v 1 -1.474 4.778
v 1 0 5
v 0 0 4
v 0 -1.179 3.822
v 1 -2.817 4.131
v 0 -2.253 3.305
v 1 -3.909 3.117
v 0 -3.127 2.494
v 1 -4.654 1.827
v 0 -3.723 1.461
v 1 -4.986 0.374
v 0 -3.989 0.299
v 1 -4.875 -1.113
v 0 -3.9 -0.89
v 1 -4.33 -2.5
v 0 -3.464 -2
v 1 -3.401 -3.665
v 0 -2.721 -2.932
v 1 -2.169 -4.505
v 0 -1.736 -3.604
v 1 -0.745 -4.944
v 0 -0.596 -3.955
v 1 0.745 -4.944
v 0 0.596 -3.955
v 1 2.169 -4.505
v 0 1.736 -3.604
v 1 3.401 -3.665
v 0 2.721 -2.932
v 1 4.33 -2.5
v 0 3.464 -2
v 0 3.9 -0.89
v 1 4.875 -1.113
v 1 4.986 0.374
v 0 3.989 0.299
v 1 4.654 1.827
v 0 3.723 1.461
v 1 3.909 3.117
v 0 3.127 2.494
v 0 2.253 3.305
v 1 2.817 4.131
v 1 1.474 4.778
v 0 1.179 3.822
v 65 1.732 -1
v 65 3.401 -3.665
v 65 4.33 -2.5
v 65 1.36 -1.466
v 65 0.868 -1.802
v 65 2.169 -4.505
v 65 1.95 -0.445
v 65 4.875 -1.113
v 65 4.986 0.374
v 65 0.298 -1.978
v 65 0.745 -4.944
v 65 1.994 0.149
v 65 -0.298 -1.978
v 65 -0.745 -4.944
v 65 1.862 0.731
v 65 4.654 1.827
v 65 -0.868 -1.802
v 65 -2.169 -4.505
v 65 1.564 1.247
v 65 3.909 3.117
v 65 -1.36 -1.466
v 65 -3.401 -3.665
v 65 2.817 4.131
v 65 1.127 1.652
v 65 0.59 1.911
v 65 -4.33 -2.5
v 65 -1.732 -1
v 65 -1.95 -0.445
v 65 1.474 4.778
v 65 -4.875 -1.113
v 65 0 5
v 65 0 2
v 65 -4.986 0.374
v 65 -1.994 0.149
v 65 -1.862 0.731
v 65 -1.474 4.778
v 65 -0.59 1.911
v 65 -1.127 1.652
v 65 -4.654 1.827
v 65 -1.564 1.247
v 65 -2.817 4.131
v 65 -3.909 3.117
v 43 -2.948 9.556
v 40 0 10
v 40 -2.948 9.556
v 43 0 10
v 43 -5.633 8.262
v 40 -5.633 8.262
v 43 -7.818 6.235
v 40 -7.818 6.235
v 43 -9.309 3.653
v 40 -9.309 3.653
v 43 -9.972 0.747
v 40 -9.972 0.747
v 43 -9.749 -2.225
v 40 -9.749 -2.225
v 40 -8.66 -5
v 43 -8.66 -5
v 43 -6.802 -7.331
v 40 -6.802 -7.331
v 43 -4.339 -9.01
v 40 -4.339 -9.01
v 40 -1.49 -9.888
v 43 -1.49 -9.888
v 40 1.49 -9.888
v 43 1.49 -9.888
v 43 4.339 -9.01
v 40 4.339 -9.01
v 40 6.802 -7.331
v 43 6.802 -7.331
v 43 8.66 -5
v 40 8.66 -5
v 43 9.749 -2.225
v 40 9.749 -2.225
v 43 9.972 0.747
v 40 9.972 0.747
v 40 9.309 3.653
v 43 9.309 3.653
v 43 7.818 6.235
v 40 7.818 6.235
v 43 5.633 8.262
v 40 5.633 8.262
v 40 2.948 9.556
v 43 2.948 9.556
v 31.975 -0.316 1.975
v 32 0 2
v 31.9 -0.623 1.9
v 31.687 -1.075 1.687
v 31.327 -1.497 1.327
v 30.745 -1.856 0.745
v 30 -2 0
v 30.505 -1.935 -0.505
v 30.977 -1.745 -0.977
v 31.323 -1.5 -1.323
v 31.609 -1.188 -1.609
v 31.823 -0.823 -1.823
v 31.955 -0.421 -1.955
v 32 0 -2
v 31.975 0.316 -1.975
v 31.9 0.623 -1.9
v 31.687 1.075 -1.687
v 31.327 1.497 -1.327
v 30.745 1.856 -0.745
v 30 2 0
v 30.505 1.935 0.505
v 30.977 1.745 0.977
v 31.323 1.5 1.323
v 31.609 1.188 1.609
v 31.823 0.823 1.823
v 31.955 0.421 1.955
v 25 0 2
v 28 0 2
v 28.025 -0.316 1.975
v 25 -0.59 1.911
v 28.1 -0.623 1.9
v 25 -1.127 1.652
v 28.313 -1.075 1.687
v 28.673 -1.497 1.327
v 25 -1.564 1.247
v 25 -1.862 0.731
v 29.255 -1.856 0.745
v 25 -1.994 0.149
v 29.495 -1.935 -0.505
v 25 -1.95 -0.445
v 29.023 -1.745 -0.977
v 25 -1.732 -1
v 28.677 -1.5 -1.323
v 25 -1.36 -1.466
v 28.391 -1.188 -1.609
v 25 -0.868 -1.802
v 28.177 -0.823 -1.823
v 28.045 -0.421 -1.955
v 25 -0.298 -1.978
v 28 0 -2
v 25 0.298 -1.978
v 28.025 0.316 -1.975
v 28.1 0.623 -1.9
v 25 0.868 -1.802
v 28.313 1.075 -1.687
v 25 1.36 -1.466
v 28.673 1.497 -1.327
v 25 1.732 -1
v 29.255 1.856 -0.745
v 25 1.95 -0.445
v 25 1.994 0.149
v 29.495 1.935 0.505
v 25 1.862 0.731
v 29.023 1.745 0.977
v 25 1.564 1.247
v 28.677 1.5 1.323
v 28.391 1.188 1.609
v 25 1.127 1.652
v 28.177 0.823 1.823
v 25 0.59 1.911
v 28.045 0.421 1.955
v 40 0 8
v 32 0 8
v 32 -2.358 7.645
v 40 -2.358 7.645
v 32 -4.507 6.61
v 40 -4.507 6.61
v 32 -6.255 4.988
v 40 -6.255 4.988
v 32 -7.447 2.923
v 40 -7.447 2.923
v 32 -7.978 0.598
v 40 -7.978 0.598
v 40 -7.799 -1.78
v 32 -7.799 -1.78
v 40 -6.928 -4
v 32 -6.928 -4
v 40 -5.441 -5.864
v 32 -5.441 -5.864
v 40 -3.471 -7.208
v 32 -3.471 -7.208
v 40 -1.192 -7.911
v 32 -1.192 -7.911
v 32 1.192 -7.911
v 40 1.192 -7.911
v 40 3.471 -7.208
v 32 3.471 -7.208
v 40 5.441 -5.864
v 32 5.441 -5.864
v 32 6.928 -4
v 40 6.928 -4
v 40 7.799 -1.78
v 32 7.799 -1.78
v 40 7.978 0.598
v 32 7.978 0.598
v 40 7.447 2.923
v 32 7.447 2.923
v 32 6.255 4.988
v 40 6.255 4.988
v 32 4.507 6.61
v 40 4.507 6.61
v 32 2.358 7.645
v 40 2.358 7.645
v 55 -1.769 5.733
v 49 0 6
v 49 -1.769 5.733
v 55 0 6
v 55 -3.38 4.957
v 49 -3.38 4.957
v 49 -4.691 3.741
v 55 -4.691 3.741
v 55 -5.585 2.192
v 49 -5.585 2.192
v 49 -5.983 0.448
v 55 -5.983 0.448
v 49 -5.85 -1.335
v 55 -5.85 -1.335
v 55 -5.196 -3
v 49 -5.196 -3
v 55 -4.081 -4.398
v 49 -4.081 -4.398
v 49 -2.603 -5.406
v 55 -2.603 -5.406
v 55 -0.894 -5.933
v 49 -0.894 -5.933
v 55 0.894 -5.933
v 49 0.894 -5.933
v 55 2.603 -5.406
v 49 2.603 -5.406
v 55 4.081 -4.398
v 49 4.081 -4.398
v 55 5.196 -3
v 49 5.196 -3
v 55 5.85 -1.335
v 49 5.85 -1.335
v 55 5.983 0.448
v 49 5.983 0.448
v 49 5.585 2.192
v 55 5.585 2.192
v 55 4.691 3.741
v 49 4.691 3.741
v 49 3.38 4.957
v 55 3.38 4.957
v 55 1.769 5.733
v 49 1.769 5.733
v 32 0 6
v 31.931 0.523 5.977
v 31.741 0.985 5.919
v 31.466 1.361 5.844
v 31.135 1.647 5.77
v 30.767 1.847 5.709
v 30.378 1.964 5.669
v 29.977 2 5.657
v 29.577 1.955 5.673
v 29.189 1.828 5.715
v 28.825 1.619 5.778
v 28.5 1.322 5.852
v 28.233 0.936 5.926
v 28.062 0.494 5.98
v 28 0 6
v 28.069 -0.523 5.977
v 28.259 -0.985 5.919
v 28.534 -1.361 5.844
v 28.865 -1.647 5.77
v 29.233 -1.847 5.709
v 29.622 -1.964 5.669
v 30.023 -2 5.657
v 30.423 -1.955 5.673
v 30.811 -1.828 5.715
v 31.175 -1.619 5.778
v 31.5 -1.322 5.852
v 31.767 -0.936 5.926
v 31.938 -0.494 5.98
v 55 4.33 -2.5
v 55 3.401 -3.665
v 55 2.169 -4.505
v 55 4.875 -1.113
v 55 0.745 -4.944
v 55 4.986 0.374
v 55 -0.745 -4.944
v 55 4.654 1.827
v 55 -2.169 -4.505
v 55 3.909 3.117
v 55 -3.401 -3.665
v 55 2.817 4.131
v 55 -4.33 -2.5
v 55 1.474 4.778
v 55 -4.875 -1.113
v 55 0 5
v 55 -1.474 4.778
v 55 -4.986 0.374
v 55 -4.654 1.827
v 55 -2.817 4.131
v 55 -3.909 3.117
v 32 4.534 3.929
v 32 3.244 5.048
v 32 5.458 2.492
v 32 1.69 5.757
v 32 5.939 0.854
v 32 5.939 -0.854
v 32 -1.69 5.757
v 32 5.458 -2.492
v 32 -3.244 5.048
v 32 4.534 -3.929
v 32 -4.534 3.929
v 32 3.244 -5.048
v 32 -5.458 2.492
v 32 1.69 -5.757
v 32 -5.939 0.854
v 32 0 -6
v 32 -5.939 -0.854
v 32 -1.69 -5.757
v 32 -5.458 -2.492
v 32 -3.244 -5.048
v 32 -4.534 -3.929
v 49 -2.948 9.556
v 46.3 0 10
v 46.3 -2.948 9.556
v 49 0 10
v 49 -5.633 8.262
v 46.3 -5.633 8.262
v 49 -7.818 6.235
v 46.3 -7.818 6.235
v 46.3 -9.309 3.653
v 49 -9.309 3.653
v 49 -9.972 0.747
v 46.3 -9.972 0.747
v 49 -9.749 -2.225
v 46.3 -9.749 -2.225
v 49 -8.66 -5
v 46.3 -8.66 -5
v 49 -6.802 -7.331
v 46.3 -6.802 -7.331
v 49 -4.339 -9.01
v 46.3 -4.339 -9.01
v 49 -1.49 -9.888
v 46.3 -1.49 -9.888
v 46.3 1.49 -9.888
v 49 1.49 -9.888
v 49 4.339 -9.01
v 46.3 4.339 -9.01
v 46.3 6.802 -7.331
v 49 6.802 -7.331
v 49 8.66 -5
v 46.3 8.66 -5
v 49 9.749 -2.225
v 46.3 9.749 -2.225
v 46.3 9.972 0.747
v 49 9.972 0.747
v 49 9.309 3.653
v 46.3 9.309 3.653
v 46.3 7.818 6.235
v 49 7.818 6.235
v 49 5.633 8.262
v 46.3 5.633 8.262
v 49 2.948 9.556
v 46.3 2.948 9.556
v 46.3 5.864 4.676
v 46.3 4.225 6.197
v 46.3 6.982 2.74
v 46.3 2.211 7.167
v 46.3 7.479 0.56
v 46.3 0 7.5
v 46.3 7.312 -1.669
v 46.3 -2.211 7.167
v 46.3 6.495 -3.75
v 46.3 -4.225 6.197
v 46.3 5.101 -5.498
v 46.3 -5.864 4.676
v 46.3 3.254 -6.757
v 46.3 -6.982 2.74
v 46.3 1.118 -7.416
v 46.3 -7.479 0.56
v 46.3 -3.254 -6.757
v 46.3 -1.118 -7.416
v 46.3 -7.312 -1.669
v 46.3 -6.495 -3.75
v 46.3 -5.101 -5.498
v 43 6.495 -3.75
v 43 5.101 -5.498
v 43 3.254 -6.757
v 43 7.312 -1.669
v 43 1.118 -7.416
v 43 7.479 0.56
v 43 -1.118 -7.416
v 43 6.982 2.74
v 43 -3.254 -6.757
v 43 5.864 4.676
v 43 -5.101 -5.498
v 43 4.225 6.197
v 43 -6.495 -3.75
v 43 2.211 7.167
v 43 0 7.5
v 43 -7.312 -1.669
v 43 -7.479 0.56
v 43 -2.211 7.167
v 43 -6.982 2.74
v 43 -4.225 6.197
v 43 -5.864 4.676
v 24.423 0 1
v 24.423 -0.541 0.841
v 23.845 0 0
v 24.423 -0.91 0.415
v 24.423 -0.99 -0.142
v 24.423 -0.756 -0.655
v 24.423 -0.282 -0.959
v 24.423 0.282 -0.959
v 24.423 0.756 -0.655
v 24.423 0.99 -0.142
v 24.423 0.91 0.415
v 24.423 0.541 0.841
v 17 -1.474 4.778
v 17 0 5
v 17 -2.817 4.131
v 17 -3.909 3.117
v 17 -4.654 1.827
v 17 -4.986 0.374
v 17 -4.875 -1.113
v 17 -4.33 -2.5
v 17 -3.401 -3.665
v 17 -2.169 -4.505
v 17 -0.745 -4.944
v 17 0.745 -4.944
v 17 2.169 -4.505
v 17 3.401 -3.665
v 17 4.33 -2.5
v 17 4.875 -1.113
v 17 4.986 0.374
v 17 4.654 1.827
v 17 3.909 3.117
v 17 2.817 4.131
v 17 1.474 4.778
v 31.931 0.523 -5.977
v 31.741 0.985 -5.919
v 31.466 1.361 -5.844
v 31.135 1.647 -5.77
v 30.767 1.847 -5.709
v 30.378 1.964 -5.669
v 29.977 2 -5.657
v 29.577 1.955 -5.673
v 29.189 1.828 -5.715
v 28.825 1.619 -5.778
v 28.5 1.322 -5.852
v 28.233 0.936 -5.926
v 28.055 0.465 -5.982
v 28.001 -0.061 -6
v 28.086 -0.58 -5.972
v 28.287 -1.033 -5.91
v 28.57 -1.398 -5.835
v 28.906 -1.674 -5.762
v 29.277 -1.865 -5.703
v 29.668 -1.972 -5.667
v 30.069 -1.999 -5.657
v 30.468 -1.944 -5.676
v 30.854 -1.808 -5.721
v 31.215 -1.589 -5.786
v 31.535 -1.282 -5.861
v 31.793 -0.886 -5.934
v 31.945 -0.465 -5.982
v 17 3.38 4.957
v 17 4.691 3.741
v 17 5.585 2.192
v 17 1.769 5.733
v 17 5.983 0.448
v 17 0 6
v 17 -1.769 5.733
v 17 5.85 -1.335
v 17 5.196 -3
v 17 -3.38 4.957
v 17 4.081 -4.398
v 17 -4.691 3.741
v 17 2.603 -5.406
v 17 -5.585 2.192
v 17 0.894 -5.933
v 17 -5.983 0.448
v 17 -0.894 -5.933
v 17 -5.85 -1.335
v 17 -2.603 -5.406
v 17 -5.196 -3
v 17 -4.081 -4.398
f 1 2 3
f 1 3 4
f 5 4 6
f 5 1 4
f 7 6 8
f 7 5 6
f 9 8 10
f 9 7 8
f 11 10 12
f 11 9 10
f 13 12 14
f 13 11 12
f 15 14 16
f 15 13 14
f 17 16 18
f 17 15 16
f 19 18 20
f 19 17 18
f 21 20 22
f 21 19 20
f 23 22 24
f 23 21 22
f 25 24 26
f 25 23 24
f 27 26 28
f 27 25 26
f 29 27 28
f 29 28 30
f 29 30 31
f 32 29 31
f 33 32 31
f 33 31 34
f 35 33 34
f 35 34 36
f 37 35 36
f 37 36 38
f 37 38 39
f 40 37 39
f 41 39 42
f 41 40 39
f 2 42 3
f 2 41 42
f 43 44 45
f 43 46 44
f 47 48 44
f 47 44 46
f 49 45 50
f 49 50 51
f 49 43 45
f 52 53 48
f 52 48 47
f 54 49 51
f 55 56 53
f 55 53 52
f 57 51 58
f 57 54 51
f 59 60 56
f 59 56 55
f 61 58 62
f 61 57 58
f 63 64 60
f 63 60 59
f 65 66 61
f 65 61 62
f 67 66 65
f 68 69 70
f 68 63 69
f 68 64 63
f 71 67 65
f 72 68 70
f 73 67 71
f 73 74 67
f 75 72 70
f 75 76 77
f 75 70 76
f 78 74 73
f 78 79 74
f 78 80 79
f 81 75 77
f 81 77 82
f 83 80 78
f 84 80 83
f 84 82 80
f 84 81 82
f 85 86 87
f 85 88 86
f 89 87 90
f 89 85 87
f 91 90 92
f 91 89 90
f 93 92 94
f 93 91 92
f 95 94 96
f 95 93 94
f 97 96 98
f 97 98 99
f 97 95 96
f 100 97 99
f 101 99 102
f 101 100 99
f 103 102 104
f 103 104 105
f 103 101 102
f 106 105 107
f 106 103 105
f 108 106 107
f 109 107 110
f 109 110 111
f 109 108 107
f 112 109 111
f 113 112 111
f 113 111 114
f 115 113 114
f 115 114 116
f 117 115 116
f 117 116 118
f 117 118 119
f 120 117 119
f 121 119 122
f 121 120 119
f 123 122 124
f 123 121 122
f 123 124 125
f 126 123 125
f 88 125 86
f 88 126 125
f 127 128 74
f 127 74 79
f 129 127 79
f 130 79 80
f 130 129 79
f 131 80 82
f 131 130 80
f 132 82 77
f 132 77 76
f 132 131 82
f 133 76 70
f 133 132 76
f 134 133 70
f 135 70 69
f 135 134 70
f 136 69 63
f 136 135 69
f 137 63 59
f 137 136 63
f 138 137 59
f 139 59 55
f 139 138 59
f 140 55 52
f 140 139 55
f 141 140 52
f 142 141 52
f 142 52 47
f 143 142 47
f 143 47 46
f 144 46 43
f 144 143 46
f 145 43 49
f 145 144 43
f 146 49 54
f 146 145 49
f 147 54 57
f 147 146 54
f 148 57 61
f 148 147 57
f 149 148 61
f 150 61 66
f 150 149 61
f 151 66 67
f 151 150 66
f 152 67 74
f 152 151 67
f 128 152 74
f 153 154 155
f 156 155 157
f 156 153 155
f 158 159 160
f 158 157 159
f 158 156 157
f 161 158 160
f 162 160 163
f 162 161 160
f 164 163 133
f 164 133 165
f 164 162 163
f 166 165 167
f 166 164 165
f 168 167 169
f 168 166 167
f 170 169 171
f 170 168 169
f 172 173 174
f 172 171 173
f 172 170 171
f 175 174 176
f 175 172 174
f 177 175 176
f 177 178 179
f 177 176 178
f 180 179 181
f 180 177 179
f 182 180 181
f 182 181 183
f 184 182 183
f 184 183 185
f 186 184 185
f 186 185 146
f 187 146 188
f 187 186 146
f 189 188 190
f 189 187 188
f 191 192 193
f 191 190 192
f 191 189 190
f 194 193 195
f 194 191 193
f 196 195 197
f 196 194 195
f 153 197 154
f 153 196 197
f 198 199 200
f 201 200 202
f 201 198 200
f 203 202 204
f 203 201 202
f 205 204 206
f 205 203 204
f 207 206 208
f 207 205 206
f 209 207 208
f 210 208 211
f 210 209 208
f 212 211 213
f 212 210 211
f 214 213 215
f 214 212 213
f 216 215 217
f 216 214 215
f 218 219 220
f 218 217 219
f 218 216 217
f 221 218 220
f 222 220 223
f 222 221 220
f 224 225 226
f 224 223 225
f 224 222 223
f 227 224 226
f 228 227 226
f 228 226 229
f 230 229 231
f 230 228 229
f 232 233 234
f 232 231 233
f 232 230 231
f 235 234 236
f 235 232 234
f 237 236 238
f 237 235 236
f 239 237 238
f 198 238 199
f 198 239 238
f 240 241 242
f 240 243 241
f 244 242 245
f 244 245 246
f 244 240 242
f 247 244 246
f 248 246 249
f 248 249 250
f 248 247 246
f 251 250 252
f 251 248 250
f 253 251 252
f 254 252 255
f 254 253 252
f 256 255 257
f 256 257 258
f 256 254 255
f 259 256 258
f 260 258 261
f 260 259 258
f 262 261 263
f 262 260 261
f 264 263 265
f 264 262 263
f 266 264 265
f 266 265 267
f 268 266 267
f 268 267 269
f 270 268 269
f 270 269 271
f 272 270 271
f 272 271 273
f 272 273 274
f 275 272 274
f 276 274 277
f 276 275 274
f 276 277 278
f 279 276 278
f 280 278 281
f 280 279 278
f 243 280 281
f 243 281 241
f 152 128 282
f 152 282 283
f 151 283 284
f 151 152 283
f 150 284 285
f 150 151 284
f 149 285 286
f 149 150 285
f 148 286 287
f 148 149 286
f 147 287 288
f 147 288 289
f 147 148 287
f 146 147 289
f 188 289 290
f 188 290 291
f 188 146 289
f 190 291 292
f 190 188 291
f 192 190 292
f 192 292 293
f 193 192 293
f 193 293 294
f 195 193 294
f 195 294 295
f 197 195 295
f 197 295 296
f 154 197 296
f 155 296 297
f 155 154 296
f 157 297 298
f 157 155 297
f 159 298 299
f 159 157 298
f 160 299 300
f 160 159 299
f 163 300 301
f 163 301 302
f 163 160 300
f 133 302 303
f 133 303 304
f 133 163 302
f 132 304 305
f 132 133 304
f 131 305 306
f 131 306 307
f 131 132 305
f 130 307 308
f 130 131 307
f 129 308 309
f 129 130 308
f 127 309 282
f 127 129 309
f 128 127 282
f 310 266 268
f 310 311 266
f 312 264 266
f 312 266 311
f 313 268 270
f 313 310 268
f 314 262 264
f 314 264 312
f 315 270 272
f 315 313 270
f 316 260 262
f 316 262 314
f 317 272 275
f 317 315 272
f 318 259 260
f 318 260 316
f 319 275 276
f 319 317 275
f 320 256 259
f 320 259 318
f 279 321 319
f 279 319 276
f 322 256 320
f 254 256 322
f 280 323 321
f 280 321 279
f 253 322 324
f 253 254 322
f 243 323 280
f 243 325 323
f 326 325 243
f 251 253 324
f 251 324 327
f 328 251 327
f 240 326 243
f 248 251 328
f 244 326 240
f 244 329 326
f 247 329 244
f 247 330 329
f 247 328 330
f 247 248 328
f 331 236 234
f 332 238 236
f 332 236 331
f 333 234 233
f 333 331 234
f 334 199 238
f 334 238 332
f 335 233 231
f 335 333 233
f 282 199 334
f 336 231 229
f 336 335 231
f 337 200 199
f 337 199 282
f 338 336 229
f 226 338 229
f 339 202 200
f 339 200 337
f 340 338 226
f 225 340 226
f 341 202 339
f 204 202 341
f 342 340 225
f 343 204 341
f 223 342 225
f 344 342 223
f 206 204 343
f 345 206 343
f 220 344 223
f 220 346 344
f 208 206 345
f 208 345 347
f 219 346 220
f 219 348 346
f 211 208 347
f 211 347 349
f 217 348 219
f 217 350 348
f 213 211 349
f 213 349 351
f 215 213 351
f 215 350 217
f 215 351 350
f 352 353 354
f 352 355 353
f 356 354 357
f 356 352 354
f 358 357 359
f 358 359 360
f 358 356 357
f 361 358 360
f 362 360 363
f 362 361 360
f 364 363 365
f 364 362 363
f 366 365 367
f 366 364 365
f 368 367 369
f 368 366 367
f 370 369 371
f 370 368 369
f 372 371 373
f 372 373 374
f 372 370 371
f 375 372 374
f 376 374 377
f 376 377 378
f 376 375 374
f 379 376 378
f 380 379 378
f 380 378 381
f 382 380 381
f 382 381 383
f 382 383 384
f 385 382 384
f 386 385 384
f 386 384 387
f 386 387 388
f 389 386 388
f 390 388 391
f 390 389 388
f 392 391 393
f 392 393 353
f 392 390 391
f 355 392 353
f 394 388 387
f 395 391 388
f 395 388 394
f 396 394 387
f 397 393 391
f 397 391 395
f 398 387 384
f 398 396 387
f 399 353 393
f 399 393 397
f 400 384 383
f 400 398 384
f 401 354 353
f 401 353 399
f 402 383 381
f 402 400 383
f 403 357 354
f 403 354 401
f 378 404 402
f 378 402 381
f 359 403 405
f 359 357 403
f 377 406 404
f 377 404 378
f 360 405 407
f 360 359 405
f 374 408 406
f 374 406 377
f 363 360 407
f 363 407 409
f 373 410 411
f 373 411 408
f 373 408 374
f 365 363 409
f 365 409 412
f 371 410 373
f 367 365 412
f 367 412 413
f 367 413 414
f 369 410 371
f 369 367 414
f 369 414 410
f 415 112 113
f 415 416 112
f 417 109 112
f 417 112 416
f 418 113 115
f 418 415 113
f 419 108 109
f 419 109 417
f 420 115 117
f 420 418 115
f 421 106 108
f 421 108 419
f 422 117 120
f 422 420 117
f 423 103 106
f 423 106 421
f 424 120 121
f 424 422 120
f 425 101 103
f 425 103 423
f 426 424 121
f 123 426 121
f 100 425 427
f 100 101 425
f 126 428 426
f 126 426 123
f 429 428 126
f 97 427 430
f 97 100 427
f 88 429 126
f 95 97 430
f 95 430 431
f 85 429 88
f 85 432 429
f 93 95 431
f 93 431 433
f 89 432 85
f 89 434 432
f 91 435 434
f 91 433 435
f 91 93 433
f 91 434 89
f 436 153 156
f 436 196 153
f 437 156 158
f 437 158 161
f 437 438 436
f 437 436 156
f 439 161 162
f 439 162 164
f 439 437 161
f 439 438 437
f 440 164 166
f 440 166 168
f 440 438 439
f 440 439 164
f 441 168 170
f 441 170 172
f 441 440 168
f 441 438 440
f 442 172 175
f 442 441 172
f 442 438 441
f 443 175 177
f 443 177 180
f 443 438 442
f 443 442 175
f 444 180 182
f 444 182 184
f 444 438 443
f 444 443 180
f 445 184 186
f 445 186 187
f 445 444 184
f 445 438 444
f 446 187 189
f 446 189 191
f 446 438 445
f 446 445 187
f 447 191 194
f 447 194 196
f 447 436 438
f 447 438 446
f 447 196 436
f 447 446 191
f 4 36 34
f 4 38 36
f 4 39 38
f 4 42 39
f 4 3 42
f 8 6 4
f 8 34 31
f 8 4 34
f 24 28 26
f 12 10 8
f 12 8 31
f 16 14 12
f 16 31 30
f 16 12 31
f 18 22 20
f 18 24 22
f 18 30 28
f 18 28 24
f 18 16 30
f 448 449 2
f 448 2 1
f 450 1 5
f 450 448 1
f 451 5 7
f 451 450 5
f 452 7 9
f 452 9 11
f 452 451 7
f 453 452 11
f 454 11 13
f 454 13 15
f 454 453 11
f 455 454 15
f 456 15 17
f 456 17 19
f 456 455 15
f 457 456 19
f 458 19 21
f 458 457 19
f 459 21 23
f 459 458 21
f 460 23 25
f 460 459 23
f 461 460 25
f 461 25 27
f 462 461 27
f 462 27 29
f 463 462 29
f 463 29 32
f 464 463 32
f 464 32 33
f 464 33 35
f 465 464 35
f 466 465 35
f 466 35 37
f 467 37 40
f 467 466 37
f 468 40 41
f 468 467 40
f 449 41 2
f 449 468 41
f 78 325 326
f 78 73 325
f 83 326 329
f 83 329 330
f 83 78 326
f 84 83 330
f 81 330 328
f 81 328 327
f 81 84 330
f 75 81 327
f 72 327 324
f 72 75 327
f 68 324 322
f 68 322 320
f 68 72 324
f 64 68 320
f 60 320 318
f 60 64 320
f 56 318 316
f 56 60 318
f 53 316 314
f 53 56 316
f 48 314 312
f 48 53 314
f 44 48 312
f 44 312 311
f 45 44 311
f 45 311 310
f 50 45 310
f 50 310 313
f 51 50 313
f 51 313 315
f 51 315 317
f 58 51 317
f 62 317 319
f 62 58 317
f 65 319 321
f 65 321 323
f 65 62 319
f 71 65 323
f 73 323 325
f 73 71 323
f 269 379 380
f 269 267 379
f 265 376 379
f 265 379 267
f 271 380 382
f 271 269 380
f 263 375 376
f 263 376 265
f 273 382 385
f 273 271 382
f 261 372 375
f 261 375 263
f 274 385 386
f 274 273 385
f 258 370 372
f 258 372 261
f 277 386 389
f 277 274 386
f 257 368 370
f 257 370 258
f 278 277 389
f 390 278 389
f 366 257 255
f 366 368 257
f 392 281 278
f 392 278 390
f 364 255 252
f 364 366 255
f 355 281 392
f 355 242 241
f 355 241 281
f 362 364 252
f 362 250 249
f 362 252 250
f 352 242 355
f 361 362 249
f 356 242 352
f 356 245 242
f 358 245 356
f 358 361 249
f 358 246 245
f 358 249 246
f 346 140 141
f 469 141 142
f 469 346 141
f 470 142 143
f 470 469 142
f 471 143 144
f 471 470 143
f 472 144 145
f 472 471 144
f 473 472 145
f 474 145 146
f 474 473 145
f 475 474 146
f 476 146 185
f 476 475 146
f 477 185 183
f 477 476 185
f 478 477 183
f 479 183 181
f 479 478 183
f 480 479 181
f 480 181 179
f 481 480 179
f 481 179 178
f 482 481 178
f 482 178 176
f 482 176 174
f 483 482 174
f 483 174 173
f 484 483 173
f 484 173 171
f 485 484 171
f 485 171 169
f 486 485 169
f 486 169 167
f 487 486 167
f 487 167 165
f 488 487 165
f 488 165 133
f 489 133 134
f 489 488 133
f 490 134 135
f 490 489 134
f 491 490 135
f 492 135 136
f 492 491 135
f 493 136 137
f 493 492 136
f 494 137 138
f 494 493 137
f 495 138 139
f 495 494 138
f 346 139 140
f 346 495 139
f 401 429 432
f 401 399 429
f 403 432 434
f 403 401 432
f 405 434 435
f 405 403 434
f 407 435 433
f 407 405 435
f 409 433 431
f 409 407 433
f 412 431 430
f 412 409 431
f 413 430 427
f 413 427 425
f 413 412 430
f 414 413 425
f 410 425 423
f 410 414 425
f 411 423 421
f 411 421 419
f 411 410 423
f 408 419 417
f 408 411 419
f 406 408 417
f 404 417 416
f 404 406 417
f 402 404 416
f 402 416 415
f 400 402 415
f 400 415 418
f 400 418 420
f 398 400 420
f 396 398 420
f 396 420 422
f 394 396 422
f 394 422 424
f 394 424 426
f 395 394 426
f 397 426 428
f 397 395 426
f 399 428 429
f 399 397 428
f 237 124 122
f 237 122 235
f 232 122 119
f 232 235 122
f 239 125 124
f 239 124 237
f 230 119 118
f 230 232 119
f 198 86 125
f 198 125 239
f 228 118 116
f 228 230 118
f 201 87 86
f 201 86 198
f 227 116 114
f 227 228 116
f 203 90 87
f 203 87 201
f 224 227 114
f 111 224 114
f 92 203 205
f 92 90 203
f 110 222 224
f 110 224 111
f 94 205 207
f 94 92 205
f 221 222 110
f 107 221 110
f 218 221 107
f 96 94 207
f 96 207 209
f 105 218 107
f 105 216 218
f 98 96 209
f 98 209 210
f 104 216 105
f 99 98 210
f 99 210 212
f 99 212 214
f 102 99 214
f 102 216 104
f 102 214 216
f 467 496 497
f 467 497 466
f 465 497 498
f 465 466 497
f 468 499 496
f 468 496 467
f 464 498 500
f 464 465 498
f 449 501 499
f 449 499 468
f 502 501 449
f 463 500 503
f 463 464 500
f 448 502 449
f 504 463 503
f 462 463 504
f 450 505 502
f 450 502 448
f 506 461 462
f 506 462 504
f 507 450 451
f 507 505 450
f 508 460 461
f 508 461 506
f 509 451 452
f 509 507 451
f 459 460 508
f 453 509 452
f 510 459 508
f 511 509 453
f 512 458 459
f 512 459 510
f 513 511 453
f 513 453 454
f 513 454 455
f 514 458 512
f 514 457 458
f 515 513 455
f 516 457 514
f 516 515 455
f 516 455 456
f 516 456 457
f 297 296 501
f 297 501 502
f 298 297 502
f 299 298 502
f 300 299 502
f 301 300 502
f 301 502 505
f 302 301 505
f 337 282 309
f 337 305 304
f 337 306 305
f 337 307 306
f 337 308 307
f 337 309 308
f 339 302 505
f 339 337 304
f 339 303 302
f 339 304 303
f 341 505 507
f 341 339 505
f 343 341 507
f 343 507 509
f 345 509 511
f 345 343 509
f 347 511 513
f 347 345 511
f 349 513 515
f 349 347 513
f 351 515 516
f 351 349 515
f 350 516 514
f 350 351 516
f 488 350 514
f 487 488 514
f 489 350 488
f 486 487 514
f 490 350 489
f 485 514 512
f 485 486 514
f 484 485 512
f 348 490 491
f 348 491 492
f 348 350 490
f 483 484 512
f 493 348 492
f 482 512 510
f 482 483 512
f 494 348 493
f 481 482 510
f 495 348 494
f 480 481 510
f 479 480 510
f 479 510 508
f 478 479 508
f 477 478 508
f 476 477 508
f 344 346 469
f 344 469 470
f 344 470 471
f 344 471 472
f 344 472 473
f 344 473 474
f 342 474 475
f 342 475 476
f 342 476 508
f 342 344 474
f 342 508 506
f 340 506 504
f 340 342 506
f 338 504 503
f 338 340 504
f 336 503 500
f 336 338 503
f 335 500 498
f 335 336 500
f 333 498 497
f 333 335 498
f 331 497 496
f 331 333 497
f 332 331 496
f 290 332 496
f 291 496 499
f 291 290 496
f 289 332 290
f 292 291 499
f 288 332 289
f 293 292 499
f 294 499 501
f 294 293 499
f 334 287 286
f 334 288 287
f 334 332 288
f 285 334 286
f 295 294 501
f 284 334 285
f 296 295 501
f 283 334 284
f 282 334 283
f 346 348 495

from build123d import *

# Parameters (mm, degrees)
CUT_EXTRUDE_1_DEPTH      = 67.520673478
CUT_EXTRUDE_1_DEPTH_BACK = 67.520673478
SKETCH_2_R               = 2
CHAMFER_1_SIZE           = 1


with BuildPart() as part:
    # Эскиз1 → Повернуть1 (revolve)
    with BuildSketch(Plane.XY, mode=Mode.PRIVATE) as revolve_1_sk:
        Polygon((0, 0), (0, 5), (17, 5), (17, 6), (32, 6), (32, 8), (40, 8), (40, 10), (43, 10), (43, 7.5), (46.3, 7.5), (46.3, 10), (49, 10), (49, 6), (55, 6), (55, 5), (65, 5), (65, 2), (25, 2), (23.845299462, 0), align=None)
    revolve(revolve_1_sk.sketch.rotate(Axis((0, 0, 0), (1, 0, 0)), 90), axis=Axis((0, 0, 0), (1, 0, 0)))

    # Эскиз2 → Вырез-Вытянуть1 (cut, two sides: drawn at the far end of the back side and taken through both)
    with BuildSketch(Plane.XY.offset(-CUT_EXTRUDE_1_DEPTH_BACK)):
        with Locations((30, 0)):
            Circle(SKETCH_2_R)
    extrude(amount=CUT_EXTRUDE_1_DEPTH + CUT_EXTRUDE_1_DEPTH_BACK, mode=Mode.SUBTRACT)

    # Фаска1
    chamfer_1_edges = [part.edges().sort_by_distance(p)[0] for p in [
        (0, 0, -5),
    ]]
    chamfer(chamfer_1_edges, length=CHAMFER_1_SIZE)


solid = part.part
